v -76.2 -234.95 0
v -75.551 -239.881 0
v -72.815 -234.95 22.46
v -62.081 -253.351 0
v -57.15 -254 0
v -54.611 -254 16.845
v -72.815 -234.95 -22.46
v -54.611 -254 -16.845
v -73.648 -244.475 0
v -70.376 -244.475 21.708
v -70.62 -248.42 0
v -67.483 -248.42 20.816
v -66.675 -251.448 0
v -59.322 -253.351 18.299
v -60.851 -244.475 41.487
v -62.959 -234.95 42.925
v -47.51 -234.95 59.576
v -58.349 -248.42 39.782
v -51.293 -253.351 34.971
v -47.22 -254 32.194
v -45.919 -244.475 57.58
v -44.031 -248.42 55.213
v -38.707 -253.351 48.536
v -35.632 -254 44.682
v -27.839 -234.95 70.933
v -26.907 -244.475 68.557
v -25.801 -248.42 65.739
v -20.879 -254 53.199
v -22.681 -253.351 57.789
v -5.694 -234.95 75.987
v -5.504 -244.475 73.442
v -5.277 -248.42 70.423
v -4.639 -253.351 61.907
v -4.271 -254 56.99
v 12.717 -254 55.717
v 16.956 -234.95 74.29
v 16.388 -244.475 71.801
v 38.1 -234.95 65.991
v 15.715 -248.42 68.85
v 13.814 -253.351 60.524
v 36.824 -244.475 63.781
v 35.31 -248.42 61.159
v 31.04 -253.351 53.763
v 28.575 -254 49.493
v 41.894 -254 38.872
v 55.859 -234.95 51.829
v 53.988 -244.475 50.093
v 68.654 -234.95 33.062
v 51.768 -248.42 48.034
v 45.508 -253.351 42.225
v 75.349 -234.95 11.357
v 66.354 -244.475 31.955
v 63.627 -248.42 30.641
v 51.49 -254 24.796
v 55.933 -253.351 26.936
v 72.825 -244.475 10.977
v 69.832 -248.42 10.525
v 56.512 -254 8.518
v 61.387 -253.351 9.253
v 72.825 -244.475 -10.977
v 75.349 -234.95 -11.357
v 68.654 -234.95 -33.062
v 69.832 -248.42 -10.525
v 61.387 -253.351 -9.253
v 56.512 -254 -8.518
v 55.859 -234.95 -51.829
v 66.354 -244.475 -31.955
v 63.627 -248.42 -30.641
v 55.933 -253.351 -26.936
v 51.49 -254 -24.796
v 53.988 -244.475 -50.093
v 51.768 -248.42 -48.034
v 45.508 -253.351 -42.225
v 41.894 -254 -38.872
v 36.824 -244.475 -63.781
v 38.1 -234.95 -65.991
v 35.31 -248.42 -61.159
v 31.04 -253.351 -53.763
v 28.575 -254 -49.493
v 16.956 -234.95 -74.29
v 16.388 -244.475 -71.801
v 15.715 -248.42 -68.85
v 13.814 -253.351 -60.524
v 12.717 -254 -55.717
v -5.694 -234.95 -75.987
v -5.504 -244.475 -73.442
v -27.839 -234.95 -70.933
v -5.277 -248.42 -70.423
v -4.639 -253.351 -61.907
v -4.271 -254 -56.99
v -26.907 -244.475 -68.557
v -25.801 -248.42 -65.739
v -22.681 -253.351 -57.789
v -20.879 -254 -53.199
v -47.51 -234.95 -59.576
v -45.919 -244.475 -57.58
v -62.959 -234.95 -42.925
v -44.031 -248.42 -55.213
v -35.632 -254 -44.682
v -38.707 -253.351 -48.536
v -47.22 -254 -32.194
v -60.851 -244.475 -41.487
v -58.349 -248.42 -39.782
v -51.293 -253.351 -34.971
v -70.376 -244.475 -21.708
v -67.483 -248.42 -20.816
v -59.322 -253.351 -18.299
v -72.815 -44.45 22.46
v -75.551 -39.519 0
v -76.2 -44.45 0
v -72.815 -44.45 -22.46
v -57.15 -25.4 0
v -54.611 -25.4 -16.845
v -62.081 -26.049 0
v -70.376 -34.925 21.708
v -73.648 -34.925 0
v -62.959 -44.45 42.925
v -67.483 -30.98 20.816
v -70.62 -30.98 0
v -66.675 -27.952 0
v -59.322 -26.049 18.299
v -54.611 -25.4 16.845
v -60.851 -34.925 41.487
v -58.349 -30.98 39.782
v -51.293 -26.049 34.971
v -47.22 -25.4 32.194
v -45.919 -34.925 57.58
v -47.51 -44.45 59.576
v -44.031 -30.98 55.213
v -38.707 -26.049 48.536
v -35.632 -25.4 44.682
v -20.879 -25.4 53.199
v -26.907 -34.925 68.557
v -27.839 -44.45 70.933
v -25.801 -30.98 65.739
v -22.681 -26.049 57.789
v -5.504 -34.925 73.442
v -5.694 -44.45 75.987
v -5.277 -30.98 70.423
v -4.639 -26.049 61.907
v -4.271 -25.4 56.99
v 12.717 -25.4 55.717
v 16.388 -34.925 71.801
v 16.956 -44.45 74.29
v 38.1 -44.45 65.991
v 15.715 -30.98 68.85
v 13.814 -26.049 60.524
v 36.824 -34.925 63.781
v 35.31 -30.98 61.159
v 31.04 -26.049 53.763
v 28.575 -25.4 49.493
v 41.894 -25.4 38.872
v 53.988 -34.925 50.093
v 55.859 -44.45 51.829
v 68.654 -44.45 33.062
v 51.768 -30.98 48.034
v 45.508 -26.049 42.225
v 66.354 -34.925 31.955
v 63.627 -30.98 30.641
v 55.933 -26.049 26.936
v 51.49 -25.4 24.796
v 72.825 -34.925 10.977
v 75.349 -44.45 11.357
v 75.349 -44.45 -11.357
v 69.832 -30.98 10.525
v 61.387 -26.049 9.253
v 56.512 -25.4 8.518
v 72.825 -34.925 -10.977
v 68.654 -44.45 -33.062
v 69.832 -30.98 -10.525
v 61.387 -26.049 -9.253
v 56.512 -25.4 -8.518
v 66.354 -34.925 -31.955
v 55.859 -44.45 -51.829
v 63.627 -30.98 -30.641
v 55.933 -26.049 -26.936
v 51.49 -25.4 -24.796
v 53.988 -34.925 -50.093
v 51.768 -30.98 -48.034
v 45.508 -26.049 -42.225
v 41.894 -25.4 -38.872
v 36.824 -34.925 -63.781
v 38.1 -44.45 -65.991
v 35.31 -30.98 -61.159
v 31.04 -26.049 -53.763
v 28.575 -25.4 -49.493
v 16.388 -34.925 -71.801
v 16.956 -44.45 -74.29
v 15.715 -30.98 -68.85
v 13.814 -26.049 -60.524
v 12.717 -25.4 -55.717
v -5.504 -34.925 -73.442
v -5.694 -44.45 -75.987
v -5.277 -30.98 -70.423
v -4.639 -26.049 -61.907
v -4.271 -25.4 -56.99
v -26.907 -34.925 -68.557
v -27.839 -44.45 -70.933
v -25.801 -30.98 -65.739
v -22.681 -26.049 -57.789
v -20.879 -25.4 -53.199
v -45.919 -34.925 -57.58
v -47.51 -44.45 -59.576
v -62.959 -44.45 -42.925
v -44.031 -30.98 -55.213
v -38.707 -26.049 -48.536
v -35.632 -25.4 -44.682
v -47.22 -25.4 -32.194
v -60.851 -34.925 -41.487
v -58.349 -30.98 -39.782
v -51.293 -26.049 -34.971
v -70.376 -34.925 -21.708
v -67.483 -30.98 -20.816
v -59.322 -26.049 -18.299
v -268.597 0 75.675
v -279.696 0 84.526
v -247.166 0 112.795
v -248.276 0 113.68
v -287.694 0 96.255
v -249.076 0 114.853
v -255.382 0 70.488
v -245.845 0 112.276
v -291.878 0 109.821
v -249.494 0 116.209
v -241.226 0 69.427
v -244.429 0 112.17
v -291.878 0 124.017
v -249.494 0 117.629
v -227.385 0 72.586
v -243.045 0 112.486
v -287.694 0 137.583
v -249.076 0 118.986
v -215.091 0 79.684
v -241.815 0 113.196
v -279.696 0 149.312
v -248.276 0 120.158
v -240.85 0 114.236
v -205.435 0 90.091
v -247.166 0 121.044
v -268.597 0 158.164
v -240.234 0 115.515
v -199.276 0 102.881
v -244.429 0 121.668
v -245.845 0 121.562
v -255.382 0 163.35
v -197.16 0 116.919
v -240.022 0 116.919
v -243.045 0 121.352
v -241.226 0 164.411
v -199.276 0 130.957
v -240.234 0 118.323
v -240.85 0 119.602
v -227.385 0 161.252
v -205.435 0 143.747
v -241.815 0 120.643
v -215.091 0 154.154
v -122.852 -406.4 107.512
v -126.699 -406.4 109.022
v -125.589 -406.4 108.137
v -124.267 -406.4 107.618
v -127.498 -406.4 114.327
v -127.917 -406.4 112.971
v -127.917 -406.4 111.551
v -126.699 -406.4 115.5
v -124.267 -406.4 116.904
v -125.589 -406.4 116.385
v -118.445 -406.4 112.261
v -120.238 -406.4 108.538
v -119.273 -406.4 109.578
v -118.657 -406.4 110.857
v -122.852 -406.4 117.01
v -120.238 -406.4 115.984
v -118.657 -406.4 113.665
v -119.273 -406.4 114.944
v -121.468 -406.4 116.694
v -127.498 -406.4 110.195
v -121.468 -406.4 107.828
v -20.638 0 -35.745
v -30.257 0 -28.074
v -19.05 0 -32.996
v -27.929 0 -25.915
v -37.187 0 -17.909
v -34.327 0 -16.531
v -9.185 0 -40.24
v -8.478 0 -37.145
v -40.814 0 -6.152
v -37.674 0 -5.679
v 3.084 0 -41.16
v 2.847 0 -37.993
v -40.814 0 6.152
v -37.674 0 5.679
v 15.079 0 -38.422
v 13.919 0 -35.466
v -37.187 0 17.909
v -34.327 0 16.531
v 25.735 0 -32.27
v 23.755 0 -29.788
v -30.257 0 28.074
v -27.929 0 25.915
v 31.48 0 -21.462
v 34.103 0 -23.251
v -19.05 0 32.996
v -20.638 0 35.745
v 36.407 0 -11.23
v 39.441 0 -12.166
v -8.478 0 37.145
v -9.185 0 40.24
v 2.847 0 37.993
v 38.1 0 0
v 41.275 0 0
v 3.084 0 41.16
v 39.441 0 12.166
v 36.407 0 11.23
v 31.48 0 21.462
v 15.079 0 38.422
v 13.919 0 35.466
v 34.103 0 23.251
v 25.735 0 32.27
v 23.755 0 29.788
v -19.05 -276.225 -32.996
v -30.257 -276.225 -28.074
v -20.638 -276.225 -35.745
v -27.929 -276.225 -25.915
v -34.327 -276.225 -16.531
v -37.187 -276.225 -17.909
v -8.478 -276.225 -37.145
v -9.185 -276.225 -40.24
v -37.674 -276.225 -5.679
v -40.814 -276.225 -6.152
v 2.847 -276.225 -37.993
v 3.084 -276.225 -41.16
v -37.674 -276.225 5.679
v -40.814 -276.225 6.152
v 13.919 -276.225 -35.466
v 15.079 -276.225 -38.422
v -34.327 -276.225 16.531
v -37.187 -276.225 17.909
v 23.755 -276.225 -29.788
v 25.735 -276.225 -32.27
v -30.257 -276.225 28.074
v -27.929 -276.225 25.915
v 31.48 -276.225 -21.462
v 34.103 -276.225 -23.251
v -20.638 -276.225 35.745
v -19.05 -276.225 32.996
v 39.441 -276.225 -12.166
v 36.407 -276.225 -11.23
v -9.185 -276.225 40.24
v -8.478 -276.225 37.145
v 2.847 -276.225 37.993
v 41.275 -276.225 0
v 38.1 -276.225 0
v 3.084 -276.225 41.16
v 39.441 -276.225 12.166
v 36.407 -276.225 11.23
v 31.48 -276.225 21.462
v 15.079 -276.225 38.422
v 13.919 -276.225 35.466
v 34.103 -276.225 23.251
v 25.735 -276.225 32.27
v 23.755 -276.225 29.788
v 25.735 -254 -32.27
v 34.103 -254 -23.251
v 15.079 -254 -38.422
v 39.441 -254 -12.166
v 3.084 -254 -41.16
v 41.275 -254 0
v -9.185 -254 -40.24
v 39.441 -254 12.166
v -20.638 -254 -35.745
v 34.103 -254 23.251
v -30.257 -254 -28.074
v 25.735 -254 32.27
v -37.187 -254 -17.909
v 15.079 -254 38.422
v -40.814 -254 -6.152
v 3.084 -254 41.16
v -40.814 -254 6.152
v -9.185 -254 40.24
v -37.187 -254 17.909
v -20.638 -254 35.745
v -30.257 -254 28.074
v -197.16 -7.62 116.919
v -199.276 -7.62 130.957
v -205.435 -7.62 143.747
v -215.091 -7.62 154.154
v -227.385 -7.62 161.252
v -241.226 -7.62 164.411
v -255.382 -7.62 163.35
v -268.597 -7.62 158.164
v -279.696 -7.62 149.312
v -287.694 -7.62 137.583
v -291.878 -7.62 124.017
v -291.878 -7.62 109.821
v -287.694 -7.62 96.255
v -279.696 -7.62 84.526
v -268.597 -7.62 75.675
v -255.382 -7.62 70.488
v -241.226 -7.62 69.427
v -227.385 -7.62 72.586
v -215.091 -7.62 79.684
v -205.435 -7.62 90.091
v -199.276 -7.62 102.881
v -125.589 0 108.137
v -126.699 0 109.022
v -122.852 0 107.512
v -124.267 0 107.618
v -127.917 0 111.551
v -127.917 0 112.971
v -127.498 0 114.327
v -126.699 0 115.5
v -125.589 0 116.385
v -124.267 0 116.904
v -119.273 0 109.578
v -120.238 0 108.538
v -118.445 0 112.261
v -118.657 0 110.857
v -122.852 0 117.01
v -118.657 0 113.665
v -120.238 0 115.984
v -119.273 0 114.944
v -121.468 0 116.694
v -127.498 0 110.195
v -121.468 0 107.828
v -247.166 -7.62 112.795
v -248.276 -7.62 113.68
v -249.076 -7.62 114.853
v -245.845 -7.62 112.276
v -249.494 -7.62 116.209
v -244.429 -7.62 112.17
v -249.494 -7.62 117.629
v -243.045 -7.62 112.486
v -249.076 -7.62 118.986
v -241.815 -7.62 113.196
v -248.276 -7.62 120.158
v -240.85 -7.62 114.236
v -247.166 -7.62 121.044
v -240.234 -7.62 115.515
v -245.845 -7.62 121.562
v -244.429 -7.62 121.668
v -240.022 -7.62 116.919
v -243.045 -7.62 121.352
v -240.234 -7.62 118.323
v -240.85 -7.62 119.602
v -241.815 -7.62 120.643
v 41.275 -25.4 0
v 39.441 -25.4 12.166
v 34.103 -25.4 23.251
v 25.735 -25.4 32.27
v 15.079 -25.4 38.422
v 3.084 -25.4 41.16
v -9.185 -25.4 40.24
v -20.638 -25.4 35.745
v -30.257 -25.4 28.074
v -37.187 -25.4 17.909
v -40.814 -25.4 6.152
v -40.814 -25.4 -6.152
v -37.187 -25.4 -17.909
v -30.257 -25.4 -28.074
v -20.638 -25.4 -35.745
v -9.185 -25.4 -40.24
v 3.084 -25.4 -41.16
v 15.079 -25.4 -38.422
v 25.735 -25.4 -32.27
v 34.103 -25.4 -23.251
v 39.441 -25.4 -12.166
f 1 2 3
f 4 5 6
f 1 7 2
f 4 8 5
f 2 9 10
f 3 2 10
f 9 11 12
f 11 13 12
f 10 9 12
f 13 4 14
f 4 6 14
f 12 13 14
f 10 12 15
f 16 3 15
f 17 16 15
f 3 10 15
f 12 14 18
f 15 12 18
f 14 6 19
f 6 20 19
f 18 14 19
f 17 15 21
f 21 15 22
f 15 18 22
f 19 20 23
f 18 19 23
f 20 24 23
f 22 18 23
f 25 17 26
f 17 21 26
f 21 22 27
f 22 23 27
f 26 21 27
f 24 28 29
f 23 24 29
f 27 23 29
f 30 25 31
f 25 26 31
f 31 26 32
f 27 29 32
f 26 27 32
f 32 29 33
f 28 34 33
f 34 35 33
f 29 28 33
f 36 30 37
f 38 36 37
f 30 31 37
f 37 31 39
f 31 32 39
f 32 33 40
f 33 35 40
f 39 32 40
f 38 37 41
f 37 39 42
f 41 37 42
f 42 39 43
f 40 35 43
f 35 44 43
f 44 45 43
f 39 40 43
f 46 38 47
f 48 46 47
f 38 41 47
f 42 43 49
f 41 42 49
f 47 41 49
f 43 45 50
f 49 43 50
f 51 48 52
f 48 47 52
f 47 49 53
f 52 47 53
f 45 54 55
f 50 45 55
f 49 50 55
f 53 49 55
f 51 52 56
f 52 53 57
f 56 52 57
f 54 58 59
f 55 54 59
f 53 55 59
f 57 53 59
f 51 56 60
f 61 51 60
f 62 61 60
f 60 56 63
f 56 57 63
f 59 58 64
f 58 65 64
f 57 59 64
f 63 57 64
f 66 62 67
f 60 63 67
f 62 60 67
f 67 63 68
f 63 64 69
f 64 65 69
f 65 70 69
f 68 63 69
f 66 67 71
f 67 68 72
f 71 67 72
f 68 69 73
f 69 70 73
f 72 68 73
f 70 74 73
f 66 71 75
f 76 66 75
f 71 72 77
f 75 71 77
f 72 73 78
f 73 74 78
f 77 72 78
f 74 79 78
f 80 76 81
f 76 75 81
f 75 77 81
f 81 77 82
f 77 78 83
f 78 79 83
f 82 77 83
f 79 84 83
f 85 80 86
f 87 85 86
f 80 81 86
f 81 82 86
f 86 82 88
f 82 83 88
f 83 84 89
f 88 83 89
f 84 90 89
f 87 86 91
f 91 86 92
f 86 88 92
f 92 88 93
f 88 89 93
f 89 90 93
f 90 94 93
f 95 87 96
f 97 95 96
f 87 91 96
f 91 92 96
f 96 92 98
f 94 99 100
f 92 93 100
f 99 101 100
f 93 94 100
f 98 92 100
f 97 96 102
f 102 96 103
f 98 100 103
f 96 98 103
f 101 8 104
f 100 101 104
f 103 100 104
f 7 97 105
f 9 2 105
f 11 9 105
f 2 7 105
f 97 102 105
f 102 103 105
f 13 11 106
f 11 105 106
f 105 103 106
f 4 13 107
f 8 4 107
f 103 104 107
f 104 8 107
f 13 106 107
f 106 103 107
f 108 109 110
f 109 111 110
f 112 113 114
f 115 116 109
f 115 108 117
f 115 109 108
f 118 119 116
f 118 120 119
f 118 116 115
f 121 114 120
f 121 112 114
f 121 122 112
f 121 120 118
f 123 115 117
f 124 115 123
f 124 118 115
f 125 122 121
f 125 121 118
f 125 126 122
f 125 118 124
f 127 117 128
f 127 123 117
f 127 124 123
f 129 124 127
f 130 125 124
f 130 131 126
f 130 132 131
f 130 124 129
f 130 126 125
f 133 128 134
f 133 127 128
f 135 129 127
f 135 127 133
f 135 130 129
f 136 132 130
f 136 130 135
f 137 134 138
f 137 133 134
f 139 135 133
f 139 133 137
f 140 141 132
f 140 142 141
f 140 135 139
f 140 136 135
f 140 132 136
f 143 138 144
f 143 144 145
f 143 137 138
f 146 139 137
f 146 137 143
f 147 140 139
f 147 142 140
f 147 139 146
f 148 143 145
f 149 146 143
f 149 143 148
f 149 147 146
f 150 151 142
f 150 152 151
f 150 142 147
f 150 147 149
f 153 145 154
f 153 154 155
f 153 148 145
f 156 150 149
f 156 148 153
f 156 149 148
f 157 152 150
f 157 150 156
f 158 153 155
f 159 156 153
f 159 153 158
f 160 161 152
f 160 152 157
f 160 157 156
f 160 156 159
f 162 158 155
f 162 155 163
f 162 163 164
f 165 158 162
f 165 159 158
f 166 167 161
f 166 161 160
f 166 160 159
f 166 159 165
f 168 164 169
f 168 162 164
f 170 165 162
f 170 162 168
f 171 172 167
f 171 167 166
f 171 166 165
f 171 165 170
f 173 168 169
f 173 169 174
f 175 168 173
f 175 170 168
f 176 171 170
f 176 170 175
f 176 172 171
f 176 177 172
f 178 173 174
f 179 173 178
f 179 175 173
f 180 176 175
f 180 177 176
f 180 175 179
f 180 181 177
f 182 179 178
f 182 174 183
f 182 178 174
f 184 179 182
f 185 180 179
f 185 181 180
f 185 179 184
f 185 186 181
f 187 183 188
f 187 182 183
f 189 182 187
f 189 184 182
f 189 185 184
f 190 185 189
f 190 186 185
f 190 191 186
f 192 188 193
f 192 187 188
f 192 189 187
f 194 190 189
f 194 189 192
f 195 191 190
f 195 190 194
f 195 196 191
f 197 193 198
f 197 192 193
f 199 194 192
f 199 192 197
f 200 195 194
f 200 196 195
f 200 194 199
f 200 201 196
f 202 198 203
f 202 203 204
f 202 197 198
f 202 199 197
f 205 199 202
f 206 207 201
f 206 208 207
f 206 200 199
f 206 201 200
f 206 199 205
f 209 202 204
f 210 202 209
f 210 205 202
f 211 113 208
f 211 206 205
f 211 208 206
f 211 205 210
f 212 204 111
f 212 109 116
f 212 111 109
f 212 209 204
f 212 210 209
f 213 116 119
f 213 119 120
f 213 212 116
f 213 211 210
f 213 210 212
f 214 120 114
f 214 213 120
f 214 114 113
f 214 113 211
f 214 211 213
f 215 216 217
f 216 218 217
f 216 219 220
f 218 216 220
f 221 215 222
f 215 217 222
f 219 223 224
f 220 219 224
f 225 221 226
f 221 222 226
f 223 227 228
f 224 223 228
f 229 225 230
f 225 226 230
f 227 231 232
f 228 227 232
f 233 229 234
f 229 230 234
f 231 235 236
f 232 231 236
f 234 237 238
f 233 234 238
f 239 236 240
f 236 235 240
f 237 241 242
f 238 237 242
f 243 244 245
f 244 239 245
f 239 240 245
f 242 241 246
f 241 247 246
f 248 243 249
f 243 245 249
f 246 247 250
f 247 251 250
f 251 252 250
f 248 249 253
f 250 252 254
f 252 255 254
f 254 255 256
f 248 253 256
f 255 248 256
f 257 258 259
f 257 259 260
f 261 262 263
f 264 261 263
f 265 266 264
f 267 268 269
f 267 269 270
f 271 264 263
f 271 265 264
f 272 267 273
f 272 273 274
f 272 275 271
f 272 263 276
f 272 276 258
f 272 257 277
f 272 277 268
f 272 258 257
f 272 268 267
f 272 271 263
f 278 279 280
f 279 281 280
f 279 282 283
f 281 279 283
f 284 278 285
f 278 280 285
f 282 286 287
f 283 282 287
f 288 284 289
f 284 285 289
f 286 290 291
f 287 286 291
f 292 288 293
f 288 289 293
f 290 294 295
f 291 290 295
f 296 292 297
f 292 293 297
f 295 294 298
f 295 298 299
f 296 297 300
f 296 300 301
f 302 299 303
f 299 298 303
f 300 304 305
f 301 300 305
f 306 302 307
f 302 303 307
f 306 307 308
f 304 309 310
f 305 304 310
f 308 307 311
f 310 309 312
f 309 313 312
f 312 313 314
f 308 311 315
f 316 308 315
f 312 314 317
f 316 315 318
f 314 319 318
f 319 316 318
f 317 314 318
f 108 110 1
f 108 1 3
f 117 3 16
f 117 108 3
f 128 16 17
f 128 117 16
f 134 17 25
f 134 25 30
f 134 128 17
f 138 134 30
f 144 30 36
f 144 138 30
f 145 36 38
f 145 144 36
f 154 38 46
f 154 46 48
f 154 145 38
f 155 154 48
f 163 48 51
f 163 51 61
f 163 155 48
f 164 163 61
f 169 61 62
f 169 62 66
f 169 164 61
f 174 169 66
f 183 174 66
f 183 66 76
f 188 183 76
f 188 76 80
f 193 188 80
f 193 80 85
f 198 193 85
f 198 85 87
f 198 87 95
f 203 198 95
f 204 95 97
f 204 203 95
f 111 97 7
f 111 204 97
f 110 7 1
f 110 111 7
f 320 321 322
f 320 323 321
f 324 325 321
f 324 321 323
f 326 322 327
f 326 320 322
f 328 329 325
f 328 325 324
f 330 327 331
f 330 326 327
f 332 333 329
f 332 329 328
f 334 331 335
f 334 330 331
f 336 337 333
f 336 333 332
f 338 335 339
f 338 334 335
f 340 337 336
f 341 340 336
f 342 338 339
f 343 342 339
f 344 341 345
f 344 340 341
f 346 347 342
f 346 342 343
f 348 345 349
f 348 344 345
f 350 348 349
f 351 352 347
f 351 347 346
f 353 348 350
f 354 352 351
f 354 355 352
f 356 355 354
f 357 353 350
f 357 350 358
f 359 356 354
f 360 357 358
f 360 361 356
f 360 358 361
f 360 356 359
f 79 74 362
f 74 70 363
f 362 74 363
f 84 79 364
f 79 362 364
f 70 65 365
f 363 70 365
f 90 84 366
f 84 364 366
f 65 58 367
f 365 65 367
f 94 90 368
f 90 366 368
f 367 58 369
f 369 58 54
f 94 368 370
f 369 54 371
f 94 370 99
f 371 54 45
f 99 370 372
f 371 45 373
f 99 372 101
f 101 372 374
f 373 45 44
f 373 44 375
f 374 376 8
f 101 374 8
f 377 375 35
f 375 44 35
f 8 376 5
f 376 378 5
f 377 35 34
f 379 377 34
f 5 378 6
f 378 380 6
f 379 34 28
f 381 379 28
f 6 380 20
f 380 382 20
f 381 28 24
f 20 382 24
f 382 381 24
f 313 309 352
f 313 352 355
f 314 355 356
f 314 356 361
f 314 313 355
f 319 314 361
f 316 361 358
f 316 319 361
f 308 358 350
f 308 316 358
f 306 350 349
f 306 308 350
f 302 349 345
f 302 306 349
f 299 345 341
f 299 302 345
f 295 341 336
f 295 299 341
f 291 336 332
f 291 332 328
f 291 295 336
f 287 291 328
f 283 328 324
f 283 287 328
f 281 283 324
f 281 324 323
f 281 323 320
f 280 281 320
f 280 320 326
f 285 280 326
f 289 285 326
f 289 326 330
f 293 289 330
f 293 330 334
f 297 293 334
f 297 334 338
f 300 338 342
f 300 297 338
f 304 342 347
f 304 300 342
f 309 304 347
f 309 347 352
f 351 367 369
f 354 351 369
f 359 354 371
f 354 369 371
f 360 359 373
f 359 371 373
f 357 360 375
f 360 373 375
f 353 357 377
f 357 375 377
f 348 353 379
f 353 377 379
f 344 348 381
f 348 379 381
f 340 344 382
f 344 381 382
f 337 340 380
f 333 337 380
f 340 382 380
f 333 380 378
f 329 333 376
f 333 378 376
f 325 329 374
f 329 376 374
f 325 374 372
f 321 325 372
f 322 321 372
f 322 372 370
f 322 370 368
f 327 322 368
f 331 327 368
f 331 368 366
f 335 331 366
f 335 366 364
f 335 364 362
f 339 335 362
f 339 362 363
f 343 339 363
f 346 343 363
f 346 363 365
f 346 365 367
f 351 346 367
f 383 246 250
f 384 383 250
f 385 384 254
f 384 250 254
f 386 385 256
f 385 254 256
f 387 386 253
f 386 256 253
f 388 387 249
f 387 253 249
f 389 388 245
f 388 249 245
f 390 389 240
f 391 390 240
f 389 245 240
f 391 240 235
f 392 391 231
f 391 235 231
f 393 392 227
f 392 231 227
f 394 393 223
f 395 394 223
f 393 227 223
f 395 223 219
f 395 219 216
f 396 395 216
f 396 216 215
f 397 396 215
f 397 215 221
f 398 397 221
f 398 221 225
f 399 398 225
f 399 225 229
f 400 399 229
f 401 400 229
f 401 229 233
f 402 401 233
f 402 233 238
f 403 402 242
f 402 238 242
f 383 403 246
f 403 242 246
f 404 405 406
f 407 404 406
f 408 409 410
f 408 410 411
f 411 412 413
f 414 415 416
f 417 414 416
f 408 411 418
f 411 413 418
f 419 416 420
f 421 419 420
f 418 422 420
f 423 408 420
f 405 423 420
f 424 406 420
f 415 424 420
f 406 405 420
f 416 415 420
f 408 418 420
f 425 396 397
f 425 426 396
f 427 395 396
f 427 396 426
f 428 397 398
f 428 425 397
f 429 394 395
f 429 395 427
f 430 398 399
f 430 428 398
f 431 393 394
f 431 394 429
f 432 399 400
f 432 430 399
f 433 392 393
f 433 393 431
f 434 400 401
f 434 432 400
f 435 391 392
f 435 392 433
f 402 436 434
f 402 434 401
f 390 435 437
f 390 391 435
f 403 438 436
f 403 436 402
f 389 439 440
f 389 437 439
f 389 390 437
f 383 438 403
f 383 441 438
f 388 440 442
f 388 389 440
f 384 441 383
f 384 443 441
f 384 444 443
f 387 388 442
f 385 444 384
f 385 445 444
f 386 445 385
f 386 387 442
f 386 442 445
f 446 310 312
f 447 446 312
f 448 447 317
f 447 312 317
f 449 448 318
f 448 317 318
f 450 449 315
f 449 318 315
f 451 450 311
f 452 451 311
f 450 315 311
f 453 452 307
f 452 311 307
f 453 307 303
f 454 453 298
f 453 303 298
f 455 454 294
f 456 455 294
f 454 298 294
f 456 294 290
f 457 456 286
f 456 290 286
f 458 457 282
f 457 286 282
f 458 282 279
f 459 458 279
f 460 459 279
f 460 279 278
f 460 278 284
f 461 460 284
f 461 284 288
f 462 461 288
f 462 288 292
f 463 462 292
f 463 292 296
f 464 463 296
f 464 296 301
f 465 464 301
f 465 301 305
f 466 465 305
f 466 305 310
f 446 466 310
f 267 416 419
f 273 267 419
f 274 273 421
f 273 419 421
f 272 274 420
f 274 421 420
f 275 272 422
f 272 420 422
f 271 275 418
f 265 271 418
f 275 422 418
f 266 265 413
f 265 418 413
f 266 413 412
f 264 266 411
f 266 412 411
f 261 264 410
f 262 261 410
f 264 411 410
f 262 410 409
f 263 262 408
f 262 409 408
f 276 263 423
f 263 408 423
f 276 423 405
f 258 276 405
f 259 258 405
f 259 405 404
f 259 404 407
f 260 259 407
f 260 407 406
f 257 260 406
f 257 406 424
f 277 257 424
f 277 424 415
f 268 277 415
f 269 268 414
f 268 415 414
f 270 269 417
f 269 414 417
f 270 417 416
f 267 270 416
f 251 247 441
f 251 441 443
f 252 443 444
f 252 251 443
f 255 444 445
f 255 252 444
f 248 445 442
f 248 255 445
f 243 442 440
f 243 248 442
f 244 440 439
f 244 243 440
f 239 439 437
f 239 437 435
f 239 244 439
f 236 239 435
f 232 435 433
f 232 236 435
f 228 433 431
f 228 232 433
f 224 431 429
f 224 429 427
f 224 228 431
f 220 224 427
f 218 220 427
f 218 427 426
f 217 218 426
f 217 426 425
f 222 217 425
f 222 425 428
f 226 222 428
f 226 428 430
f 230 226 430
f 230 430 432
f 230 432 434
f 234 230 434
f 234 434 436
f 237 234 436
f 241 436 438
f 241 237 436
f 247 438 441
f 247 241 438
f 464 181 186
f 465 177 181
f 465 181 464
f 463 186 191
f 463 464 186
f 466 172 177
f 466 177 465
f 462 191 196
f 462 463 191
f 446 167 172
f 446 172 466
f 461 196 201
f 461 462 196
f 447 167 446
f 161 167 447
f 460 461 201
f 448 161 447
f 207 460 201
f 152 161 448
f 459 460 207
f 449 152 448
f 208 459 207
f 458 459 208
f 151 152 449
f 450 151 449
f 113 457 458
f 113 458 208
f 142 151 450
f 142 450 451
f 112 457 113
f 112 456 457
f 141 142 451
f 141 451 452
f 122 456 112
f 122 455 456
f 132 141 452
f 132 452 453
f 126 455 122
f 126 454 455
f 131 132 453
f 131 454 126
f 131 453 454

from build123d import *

# Parameters (mm, degrees)
F0_R     = 41.275
F0_R_2   = 38.1
F1_DEPTH = 276.225
F3_START = -25.4
F2_R     = 76.2
F2_R_2   = 41.275
F3_DEPTH = 228.6
F4_R     = 19.05
F5_R     = 47.625
F5_R_2   = 4.7625
F6_DEPTH = 7.62
F7_R     = 4.7625
F8_DEPTH = 406.4


with BuildPart() as f1:
    # F0 (on Front) → F1 (new body)
    with BuildSketch(Plane.XZ):
        Circle(F0_R)
        Circle(F0_R_2, mode=Mode.SUBTRACT)
    extrude(amount=F1_DEPTH)

    # F2 (on face) → F3 (join)
    with BuildSketch(Plane(origin=(0, 0, 0), x_dir=(-1, 0, 0), z_dir=(0, 1, 0)).offset(F3_START)):
        Circle(F2_R)
        Circle(F2_R_2, mode=Mode.SUBTRACT)
    extrude(amount=-F3_DEPTH)

    # F4
    f4_edges = [f1.edges().sort_by_distance(p)[0] for p in [
        (76.2, -25.4, 0),
        (76.2, -254, 0),
    ]]
    fillet(f4_edges, radius=F4_R)


with BuildPart() as f6:
    # F5 (on Front) → F6 (new body)
    with BuildSketch(Plane.XZ):
        with Locations((-244.7848618031, 116.9191375375)):
            Circle(F5_R)
        with Locations((-244.7848618031, 116.9191375375)):
            Circle(F5_R_2, mode=Mode.SUBTRACT)
    extrude(amount=F6_DEPTH)


with BuildPart() as f8:
    # F7 (on Front) → F8 (new body)
    with BuildSketch(Plane.XZ):
        with Locations((-123.2076063752, 112.2609972954)):
            Circle(F7_R)
    extrude(amount=F8_DEPTH)


solid = Compound([f1.part, f6.part, f8.part])
